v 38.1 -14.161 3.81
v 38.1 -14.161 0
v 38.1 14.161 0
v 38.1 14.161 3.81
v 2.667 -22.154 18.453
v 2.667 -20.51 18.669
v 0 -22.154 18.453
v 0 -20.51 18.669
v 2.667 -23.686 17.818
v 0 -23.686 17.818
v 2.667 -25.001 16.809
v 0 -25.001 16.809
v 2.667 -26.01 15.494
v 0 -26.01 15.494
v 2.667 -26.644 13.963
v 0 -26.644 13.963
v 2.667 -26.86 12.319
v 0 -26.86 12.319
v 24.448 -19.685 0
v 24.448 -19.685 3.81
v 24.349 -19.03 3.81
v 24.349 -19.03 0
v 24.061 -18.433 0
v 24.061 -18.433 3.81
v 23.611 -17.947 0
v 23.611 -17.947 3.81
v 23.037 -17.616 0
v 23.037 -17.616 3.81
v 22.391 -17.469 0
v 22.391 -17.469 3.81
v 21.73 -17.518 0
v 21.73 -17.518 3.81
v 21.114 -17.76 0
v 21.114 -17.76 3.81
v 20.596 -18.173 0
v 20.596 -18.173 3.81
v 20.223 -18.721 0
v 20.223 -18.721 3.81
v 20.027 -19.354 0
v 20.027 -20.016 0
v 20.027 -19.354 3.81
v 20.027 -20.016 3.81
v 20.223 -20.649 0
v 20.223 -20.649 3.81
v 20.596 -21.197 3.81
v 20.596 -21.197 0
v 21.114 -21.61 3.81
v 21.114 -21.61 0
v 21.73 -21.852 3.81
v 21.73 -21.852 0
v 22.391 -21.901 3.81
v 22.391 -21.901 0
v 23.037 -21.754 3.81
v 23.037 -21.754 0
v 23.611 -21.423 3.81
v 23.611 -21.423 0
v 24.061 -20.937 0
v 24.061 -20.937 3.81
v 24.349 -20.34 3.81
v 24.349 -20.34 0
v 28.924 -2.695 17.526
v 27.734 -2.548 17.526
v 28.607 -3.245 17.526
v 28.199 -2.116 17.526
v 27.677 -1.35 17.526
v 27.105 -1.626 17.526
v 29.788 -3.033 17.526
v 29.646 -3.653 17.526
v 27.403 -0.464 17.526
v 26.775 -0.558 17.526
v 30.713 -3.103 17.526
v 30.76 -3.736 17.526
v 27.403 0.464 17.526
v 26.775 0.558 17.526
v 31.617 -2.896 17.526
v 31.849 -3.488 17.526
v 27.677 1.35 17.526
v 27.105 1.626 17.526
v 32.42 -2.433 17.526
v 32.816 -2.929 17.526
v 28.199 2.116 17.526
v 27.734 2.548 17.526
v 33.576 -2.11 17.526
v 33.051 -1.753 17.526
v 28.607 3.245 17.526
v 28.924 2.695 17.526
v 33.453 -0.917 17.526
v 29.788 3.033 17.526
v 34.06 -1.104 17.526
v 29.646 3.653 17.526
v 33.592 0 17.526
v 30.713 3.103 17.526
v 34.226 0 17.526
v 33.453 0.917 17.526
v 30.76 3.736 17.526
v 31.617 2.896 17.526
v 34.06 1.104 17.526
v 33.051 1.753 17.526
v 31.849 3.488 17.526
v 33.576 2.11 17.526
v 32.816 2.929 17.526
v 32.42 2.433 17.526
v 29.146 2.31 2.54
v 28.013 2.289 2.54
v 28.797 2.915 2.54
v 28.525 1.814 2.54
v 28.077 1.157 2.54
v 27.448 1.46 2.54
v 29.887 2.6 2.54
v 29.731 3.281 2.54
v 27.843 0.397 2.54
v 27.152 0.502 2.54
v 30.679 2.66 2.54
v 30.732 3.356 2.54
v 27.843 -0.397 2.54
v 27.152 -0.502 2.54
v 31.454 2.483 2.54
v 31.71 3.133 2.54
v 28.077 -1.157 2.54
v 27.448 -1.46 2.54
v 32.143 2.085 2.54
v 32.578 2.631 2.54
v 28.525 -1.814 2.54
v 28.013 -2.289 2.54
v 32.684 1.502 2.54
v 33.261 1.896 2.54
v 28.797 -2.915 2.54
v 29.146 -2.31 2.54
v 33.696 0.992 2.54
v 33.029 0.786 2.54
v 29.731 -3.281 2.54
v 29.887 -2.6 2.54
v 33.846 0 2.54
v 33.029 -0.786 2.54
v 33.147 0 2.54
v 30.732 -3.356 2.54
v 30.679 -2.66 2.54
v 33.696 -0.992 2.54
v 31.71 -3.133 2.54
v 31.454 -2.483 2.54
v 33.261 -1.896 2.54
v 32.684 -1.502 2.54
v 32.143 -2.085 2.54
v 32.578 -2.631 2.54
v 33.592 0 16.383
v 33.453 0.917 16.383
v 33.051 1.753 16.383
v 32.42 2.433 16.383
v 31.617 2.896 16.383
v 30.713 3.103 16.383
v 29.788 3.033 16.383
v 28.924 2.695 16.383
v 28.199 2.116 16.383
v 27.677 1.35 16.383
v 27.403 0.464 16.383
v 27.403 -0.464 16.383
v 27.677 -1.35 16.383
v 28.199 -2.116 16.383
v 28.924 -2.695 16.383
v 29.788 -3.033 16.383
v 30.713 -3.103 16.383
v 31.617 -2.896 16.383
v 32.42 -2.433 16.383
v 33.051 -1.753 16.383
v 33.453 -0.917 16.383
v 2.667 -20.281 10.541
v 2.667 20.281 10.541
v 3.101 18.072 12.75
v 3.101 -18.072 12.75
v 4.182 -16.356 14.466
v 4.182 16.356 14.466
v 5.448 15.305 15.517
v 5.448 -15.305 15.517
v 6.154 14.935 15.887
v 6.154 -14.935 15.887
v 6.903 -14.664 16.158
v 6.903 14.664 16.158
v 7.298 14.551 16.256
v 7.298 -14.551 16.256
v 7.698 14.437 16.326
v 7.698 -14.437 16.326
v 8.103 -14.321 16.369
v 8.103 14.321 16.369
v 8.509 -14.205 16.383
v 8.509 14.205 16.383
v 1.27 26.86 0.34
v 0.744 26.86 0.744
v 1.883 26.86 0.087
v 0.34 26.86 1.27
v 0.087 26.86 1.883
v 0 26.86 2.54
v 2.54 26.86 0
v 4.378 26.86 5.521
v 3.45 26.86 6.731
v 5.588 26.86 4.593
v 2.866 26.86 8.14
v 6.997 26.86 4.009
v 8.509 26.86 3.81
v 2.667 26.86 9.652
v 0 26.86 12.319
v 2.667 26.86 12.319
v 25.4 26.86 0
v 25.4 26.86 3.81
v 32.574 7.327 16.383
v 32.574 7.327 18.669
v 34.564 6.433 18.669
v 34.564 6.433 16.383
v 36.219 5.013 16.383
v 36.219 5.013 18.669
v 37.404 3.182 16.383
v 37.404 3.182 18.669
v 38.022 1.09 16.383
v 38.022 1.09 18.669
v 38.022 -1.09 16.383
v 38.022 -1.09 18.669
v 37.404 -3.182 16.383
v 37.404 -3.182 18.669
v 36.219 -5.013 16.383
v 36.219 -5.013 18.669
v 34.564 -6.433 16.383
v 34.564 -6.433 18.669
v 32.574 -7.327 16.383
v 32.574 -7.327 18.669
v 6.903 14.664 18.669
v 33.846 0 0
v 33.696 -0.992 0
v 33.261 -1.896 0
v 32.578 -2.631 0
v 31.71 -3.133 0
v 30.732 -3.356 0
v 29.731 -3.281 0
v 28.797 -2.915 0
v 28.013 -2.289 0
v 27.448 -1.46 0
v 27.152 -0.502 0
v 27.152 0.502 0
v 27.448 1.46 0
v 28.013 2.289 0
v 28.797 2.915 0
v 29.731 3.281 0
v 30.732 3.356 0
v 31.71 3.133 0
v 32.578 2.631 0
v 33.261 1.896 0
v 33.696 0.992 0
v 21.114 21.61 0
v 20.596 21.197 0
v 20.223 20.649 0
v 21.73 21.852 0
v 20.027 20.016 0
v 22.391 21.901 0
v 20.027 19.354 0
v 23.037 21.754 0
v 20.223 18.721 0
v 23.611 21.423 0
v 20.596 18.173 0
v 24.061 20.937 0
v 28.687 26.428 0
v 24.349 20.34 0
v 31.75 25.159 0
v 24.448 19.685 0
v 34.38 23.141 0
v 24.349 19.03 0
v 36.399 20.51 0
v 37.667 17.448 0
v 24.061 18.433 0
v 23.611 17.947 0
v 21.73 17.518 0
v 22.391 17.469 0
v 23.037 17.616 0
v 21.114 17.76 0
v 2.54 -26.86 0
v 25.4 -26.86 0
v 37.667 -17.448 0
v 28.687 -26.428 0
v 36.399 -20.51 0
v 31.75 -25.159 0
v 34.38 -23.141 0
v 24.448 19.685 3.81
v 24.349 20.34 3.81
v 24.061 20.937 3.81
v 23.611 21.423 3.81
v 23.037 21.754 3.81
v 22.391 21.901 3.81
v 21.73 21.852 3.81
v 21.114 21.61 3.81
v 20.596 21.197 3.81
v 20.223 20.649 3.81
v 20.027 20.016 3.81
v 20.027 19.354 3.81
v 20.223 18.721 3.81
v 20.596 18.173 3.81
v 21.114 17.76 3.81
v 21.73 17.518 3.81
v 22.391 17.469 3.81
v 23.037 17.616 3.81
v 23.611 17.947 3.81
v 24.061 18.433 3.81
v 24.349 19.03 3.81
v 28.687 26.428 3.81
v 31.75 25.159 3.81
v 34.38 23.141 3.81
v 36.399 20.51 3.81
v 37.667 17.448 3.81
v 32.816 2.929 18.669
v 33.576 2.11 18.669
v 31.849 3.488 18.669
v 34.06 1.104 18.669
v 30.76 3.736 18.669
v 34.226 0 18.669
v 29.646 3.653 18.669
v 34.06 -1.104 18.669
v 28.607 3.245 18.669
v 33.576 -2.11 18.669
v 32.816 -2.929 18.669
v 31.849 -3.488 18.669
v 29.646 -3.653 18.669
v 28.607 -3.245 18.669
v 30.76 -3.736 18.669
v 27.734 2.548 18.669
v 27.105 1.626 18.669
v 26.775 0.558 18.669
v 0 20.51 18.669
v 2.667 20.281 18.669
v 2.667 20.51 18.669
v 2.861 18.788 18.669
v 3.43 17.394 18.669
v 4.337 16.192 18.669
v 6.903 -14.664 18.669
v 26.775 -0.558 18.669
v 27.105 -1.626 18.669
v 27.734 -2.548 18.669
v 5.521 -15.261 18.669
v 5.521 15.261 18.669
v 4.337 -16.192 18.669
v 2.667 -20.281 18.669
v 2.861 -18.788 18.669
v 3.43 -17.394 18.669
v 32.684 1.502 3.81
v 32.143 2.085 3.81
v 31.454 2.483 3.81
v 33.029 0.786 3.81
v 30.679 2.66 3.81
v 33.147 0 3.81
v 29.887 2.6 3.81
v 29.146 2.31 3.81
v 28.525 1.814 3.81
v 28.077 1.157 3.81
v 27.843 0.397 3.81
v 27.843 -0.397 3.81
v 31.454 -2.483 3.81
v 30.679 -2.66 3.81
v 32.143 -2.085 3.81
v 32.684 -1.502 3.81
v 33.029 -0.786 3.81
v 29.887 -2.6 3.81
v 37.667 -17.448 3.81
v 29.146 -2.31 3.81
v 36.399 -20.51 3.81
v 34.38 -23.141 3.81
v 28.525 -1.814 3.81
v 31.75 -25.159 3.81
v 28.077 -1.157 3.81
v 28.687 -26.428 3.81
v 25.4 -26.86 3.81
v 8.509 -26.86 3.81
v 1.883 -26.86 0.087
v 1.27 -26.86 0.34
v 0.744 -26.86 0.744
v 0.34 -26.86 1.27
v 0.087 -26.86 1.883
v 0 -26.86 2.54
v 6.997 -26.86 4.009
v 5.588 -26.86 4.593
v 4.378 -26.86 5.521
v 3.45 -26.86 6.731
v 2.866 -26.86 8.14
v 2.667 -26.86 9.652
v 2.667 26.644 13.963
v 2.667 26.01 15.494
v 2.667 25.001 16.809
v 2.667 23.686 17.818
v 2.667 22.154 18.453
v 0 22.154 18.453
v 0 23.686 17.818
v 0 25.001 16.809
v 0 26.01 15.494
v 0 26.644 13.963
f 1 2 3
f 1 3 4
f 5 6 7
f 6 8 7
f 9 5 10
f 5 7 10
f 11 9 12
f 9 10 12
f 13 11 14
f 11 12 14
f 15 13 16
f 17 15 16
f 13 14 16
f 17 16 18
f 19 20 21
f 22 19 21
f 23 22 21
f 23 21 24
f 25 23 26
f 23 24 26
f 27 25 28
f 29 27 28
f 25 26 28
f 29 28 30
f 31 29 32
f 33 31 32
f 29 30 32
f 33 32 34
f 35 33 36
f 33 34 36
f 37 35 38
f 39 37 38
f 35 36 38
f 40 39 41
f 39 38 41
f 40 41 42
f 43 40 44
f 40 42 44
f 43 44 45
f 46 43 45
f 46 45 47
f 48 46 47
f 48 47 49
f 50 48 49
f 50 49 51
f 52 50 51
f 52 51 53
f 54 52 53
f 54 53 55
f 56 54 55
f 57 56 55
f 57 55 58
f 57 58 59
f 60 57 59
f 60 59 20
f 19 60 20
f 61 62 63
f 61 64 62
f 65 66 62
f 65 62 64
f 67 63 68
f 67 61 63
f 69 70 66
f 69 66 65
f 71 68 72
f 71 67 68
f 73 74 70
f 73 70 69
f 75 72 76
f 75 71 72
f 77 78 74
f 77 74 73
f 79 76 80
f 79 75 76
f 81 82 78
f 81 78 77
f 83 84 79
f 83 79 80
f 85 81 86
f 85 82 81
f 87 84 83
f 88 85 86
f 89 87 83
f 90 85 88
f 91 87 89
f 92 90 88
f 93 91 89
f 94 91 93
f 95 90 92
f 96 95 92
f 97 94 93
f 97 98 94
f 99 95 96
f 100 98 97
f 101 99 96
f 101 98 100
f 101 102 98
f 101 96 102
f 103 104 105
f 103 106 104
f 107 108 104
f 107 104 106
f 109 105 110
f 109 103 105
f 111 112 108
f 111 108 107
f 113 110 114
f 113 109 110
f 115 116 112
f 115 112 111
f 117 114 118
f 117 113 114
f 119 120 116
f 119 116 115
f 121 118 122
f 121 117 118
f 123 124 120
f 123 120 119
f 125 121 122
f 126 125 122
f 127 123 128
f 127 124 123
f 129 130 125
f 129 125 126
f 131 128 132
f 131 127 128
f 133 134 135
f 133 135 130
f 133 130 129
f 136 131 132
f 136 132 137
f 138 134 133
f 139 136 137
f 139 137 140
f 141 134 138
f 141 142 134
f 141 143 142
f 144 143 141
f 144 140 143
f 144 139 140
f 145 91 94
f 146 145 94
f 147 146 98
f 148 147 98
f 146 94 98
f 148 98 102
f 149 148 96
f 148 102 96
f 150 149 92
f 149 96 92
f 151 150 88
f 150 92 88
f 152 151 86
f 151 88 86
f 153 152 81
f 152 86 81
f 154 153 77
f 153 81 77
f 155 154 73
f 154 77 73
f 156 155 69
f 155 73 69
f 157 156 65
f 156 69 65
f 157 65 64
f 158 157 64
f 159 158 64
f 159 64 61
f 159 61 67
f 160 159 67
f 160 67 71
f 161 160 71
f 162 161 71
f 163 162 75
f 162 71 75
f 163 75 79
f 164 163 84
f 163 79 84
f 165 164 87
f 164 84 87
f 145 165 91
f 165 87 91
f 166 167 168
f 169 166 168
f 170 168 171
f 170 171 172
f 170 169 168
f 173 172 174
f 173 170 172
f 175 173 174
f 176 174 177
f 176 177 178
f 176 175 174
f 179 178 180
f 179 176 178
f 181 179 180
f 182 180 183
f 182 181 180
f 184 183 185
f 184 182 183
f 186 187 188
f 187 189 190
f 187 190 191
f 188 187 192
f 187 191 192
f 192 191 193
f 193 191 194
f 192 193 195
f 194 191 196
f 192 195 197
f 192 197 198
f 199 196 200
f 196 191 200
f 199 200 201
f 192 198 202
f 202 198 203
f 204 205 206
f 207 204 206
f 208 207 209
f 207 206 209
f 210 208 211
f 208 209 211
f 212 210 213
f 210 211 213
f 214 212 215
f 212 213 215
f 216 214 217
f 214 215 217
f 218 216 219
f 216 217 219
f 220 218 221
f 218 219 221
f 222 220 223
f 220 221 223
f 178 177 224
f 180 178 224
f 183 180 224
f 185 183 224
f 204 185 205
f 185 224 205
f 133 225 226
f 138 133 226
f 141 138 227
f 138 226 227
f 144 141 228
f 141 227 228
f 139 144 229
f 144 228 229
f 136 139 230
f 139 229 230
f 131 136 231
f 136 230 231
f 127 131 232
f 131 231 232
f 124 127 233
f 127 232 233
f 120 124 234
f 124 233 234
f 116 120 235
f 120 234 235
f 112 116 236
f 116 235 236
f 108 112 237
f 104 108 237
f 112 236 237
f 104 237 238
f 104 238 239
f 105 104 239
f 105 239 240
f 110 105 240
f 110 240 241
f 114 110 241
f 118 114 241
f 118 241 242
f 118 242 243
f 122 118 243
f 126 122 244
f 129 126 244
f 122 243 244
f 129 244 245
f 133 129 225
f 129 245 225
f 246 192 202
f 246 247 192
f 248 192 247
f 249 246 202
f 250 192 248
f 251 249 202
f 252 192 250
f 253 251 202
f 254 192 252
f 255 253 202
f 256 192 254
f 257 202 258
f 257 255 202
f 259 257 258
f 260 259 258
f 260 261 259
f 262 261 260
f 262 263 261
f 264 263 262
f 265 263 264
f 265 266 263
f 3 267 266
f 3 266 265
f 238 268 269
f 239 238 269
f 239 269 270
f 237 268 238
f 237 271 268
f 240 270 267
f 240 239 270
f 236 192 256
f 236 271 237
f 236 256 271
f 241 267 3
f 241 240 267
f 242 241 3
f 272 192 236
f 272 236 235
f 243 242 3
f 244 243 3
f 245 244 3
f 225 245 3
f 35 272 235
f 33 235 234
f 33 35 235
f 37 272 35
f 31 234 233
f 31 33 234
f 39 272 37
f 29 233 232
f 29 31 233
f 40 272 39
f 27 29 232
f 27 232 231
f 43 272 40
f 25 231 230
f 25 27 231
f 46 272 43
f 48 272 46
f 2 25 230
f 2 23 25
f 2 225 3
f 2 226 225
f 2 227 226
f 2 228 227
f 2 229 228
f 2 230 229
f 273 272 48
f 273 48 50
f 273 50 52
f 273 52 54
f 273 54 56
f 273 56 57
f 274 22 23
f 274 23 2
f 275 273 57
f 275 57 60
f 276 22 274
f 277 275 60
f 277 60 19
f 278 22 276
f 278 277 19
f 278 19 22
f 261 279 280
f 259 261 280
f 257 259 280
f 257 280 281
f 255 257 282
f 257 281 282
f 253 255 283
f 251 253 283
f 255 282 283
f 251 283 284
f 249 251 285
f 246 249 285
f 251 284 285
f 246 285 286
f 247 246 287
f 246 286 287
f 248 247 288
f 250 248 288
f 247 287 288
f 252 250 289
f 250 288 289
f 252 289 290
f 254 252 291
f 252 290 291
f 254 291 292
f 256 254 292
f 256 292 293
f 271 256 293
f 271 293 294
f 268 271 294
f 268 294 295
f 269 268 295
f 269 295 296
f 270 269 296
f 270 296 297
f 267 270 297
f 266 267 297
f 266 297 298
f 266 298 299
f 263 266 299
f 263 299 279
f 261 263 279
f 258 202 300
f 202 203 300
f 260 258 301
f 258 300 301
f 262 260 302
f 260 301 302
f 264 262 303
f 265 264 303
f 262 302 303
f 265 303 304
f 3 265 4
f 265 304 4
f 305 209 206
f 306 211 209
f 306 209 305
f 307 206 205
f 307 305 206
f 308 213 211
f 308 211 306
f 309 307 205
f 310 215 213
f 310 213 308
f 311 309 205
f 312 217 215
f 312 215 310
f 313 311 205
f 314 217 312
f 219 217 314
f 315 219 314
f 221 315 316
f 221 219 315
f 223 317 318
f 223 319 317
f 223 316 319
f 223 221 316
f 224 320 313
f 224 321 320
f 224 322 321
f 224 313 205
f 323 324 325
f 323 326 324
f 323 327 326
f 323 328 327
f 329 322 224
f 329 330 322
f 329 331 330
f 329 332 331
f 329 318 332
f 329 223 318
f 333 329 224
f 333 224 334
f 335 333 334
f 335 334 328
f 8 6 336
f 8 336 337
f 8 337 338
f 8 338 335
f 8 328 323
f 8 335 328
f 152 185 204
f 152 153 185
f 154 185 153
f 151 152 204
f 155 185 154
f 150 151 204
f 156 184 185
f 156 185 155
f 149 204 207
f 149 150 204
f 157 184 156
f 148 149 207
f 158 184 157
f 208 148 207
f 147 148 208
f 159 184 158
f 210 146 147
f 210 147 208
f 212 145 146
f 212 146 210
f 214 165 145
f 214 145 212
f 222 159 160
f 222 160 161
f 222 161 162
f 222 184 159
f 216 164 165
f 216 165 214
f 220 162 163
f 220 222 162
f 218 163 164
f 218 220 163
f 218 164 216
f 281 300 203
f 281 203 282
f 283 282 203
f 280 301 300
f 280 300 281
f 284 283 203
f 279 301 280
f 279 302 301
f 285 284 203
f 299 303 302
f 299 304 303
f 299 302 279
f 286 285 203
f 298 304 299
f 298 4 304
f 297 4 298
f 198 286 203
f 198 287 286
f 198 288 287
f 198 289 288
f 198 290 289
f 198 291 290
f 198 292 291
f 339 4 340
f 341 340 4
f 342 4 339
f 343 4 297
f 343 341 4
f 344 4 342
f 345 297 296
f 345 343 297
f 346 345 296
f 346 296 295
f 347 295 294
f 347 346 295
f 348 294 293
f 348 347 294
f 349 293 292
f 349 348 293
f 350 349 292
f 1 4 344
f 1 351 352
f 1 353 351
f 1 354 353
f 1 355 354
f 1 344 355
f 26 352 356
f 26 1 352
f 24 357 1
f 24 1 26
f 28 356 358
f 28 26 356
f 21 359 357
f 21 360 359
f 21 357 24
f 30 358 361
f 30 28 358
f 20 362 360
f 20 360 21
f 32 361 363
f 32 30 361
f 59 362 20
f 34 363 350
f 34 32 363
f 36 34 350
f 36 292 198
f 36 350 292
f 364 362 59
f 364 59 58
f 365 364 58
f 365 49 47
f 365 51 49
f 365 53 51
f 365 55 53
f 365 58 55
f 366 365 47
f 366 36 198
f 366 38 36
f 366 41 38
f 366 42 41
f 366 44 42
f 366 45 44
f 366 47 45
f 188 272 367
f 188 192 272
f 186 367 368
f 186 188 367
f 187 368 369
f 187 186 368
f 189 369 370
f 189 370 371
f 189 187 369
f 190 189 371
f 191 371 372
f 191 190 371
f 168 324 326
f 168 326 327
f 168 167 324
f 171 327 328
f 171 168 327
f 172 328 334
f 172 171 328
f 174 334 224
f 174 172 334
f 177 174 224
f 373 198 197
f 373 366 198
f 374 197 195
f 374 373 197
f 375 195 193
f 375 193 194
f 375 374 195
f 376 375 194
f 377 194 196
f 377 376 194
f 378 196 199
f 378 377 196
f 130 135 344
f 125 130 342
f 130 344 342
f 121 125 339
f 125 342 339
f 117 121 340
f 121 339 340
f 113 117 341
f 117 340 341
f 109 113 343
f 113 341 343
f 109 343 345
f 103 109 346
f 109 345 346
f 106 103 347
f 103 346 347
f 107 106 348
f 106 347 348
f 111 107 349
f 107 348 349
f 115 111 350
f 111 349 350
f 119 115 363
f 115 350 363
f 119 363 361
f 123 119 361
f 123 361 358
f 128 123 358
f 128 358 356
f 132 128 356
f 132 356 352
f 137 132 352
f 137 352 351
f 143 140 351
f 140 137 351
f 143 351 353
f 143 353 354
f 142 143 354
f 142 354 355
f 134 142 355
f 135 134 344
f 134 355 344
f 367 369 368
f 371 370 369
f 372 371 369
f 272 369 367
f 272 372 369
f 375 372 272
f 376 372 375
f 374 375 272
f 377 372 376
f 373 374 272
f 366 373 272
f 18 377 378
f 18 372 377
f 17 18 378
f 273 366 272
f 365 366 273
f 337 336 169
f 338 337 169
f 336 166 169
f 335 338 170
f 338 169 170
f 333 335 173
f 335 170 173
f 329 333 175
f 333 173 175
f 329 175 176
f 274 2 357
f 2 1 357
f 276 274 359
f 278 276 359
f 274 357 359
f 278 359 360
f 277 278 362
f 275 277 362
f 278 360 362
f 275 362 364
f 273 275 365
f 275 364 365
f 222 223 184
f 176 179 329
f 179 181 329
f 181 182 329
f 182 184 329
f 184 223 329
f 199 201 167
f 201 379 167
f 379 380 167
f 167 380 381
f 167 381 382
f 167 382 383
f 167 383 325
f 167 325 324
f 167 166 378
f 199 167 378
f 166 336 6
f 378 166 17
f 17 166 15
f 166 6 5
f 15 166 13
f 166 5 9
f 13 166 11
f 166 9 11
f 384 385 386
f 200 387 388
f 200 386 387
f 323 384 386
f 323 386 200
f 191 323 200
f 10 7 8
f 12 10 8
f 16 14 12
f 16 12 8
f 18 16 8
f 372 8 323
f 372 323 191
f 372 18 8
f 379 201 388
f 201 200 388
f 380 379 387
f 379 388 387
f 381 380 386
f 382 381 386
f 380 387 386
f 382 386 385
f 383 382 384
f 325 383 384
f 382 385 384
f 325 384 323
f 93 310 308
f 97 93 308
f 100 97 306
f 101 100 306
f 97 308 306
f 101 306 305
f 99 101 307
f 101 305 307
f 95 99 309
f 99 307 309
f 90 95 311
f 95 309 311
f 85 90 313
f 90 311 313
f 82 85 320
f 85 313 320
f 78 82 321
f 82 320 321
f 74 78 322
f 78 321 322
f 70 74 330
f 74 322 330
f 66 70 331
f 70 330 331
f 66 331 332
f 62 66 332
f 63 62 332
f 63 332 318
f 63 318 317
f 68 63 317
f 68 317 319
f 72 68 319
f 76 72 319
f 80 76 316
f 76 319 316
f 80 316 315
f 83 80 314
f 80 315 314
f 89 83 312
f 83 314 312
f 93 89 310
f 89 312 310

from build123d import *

# Parameters (mm, degrees)
F1_DEPTH      = 26.8605
F2_R          = 2.667
F2_R_2        = 2.2225
F3_DEPTH      = 3.811
F3_DEPTH_BACK = 14.86
F4_R          = 2.2225
F5_DEPTH      = 2.286
F6_R          = 3.7465
F6_R_2        = 2.667
F7_DEPTH      = 1.143
F8_R          = 5.842
F9_R          = 6.35
F10_R         = 12.7
F11_R         = 2.54
F12_R         = 3.1115
F12_R_2       = 2.667
F13_DEPTH     = 1.143
F14_R         = 3.3655
F14_R_2       = 2.667
F15_DEPTH     = 2.54


with BuildPart() as f1:
    # F0 (on Front) → F1 (new body, symmetric)
    with BuildSketch(Plane.XZ):
        Polygon((0, 0), (38.1, 0), (38.1, 3.81), (2.667, 3.81), (2.667, 16.383), (38.1, 16.383), (38.1, 18.669), (0, 18.669), align=None)
    extrude(amount=F1_DEPTH, both=True)

    # F2 (on face) → F3 (cut, two sides)
    with BuildSketch(Plane.XY.offset(3.81)) as f3_sk:
        with Locations((30.48, 0)):
            Circle(F2_R)
        with Locations((22.225, 19.685)):
            Circle(F2_R_2)
        with Locations((22.225, -19.685)):
            Circle(F2_R_2)
    extrude(amount=-F3_DEPTH, mode=Mode.SUBTRACT)
    extrude(f3_sk.sketch, amount=F3_DEPTH_BACK, mode=Mode.SUBTRACT)

    # F4 (on face) → F5 (cut, through all)
    with BuildSketch(Plane.XY.offset(18.669)):
        with BuildLine():
            ThreePointArc((32.5741697301, 7.3265853671), (36.5636655621, 4.5883998658), (38.1, 0))
            Line((38.1, 0), (38.1, 26.8605))
            Line((38.1, 26.8605), (2.667, 26.8605))
            Line((2.667, 26.8605), (2.667, 15.875))
            Line((2.667, 15.875), (32.5741697301, 7.3265853671))
        make_face()
        with Locations((22.225, 19.685)):
            Circle(F4_R, mode=Mode.SUBTRACT)
        with BuildLine():
            Line((38.1, -26.8605), (38.1, 0))
            ThreePointArc((38.1, 0), (36.5636655621, -4.5883998658), (32.5741697301, -7.3265853671))
            Line((32.5741697301, -7.3265853671), (2.667, -15.875))
            Line((2.667, -15.875), (2.667, -26.8605))
            Line((2.667, -26.8605), (38.1, -26.8605))
        make_face()
        with Locations((22.225, -19.685)):
            Circle(F4_R, mode=Mode.SUBTRACT)
    extrude(amount=-F5_DEPTH, mode=Mode.SUBTRACT)

    # F6 (on face) → F7 (cut)
    with BuildSketch(Plane.XY.offset(18.669)):
        with Locations((30.48, 0)):
            Circle(F6_R)
        with Locations((30.48, 0)):
            Circle(F6_R_2, mode=Mode.SUBTRACT)
    extrude(amount=-F7_DEPTH, mode=Mode.SUBTRACT)

    # F8
    f8_edges = [f1.edges().sort_by_distance(p)[0] for p in [
        (2.667, 0, 3.81),
        (2.667, 0, 16.383),
        (2.667, 15.875, 17.526),
        (2.667, -15.875, 17.526),
    ]]
    fillet(f8_edges, radius=F8_R)

    # F9
    f9_edges = [f1.edges().sort_by_distance(p)[0] for p in [
        (1.3335, 26.8605, 18.669),
        (1.3335, -26.8605, 18.669),
    ]]
    fillet(f9_edges, radius=F9_R)

    # F10
    f10_edges = [f1.edges().sort_by_distance(p)[0] for p in [
        (38.1, 26.8605, 1.905),
        (38.1, -26.8605, 1.905),
    ]]
    fillet(f10_edges, radius=F10_R)

    # F11
    f11_edges = [f1.edges().sort_by_distance(p)[0] for p in [
        (0, 0, 0),
    ]]
    fillet(f11_edges, radius=F11_R)

    # F12 (on face) → F13 (cut, through all)
    with BuildSketch(Plane.XY.offset(17.526)):
        with Locations((30.48, 0)):
            Circle(F12_R)
        with Locations((30.48, 0)):
            Circle(F12_R_2, mode=Mode.SUBTRACT)
    extrude(amount=-F13_DEPTH, mode=Mode.SUBTRACT)

    # F14 (on face) → F15 (cut)
    with BuildSketch(Plane(origin=(0, 0, 0), x_dir=(1, 0, 0), z_dir=(0, 0, -1))):
        with Locations((30.48, 0)):
            Circle(F14_R)
        with Locations((30.48, 0)):
            Circle(F14_R_2, mode=Mode.SUBTRACT)
    extrude(amount=-F15_DEPTH, mode=Mode.SUBTRACT)


solid = f1.part
